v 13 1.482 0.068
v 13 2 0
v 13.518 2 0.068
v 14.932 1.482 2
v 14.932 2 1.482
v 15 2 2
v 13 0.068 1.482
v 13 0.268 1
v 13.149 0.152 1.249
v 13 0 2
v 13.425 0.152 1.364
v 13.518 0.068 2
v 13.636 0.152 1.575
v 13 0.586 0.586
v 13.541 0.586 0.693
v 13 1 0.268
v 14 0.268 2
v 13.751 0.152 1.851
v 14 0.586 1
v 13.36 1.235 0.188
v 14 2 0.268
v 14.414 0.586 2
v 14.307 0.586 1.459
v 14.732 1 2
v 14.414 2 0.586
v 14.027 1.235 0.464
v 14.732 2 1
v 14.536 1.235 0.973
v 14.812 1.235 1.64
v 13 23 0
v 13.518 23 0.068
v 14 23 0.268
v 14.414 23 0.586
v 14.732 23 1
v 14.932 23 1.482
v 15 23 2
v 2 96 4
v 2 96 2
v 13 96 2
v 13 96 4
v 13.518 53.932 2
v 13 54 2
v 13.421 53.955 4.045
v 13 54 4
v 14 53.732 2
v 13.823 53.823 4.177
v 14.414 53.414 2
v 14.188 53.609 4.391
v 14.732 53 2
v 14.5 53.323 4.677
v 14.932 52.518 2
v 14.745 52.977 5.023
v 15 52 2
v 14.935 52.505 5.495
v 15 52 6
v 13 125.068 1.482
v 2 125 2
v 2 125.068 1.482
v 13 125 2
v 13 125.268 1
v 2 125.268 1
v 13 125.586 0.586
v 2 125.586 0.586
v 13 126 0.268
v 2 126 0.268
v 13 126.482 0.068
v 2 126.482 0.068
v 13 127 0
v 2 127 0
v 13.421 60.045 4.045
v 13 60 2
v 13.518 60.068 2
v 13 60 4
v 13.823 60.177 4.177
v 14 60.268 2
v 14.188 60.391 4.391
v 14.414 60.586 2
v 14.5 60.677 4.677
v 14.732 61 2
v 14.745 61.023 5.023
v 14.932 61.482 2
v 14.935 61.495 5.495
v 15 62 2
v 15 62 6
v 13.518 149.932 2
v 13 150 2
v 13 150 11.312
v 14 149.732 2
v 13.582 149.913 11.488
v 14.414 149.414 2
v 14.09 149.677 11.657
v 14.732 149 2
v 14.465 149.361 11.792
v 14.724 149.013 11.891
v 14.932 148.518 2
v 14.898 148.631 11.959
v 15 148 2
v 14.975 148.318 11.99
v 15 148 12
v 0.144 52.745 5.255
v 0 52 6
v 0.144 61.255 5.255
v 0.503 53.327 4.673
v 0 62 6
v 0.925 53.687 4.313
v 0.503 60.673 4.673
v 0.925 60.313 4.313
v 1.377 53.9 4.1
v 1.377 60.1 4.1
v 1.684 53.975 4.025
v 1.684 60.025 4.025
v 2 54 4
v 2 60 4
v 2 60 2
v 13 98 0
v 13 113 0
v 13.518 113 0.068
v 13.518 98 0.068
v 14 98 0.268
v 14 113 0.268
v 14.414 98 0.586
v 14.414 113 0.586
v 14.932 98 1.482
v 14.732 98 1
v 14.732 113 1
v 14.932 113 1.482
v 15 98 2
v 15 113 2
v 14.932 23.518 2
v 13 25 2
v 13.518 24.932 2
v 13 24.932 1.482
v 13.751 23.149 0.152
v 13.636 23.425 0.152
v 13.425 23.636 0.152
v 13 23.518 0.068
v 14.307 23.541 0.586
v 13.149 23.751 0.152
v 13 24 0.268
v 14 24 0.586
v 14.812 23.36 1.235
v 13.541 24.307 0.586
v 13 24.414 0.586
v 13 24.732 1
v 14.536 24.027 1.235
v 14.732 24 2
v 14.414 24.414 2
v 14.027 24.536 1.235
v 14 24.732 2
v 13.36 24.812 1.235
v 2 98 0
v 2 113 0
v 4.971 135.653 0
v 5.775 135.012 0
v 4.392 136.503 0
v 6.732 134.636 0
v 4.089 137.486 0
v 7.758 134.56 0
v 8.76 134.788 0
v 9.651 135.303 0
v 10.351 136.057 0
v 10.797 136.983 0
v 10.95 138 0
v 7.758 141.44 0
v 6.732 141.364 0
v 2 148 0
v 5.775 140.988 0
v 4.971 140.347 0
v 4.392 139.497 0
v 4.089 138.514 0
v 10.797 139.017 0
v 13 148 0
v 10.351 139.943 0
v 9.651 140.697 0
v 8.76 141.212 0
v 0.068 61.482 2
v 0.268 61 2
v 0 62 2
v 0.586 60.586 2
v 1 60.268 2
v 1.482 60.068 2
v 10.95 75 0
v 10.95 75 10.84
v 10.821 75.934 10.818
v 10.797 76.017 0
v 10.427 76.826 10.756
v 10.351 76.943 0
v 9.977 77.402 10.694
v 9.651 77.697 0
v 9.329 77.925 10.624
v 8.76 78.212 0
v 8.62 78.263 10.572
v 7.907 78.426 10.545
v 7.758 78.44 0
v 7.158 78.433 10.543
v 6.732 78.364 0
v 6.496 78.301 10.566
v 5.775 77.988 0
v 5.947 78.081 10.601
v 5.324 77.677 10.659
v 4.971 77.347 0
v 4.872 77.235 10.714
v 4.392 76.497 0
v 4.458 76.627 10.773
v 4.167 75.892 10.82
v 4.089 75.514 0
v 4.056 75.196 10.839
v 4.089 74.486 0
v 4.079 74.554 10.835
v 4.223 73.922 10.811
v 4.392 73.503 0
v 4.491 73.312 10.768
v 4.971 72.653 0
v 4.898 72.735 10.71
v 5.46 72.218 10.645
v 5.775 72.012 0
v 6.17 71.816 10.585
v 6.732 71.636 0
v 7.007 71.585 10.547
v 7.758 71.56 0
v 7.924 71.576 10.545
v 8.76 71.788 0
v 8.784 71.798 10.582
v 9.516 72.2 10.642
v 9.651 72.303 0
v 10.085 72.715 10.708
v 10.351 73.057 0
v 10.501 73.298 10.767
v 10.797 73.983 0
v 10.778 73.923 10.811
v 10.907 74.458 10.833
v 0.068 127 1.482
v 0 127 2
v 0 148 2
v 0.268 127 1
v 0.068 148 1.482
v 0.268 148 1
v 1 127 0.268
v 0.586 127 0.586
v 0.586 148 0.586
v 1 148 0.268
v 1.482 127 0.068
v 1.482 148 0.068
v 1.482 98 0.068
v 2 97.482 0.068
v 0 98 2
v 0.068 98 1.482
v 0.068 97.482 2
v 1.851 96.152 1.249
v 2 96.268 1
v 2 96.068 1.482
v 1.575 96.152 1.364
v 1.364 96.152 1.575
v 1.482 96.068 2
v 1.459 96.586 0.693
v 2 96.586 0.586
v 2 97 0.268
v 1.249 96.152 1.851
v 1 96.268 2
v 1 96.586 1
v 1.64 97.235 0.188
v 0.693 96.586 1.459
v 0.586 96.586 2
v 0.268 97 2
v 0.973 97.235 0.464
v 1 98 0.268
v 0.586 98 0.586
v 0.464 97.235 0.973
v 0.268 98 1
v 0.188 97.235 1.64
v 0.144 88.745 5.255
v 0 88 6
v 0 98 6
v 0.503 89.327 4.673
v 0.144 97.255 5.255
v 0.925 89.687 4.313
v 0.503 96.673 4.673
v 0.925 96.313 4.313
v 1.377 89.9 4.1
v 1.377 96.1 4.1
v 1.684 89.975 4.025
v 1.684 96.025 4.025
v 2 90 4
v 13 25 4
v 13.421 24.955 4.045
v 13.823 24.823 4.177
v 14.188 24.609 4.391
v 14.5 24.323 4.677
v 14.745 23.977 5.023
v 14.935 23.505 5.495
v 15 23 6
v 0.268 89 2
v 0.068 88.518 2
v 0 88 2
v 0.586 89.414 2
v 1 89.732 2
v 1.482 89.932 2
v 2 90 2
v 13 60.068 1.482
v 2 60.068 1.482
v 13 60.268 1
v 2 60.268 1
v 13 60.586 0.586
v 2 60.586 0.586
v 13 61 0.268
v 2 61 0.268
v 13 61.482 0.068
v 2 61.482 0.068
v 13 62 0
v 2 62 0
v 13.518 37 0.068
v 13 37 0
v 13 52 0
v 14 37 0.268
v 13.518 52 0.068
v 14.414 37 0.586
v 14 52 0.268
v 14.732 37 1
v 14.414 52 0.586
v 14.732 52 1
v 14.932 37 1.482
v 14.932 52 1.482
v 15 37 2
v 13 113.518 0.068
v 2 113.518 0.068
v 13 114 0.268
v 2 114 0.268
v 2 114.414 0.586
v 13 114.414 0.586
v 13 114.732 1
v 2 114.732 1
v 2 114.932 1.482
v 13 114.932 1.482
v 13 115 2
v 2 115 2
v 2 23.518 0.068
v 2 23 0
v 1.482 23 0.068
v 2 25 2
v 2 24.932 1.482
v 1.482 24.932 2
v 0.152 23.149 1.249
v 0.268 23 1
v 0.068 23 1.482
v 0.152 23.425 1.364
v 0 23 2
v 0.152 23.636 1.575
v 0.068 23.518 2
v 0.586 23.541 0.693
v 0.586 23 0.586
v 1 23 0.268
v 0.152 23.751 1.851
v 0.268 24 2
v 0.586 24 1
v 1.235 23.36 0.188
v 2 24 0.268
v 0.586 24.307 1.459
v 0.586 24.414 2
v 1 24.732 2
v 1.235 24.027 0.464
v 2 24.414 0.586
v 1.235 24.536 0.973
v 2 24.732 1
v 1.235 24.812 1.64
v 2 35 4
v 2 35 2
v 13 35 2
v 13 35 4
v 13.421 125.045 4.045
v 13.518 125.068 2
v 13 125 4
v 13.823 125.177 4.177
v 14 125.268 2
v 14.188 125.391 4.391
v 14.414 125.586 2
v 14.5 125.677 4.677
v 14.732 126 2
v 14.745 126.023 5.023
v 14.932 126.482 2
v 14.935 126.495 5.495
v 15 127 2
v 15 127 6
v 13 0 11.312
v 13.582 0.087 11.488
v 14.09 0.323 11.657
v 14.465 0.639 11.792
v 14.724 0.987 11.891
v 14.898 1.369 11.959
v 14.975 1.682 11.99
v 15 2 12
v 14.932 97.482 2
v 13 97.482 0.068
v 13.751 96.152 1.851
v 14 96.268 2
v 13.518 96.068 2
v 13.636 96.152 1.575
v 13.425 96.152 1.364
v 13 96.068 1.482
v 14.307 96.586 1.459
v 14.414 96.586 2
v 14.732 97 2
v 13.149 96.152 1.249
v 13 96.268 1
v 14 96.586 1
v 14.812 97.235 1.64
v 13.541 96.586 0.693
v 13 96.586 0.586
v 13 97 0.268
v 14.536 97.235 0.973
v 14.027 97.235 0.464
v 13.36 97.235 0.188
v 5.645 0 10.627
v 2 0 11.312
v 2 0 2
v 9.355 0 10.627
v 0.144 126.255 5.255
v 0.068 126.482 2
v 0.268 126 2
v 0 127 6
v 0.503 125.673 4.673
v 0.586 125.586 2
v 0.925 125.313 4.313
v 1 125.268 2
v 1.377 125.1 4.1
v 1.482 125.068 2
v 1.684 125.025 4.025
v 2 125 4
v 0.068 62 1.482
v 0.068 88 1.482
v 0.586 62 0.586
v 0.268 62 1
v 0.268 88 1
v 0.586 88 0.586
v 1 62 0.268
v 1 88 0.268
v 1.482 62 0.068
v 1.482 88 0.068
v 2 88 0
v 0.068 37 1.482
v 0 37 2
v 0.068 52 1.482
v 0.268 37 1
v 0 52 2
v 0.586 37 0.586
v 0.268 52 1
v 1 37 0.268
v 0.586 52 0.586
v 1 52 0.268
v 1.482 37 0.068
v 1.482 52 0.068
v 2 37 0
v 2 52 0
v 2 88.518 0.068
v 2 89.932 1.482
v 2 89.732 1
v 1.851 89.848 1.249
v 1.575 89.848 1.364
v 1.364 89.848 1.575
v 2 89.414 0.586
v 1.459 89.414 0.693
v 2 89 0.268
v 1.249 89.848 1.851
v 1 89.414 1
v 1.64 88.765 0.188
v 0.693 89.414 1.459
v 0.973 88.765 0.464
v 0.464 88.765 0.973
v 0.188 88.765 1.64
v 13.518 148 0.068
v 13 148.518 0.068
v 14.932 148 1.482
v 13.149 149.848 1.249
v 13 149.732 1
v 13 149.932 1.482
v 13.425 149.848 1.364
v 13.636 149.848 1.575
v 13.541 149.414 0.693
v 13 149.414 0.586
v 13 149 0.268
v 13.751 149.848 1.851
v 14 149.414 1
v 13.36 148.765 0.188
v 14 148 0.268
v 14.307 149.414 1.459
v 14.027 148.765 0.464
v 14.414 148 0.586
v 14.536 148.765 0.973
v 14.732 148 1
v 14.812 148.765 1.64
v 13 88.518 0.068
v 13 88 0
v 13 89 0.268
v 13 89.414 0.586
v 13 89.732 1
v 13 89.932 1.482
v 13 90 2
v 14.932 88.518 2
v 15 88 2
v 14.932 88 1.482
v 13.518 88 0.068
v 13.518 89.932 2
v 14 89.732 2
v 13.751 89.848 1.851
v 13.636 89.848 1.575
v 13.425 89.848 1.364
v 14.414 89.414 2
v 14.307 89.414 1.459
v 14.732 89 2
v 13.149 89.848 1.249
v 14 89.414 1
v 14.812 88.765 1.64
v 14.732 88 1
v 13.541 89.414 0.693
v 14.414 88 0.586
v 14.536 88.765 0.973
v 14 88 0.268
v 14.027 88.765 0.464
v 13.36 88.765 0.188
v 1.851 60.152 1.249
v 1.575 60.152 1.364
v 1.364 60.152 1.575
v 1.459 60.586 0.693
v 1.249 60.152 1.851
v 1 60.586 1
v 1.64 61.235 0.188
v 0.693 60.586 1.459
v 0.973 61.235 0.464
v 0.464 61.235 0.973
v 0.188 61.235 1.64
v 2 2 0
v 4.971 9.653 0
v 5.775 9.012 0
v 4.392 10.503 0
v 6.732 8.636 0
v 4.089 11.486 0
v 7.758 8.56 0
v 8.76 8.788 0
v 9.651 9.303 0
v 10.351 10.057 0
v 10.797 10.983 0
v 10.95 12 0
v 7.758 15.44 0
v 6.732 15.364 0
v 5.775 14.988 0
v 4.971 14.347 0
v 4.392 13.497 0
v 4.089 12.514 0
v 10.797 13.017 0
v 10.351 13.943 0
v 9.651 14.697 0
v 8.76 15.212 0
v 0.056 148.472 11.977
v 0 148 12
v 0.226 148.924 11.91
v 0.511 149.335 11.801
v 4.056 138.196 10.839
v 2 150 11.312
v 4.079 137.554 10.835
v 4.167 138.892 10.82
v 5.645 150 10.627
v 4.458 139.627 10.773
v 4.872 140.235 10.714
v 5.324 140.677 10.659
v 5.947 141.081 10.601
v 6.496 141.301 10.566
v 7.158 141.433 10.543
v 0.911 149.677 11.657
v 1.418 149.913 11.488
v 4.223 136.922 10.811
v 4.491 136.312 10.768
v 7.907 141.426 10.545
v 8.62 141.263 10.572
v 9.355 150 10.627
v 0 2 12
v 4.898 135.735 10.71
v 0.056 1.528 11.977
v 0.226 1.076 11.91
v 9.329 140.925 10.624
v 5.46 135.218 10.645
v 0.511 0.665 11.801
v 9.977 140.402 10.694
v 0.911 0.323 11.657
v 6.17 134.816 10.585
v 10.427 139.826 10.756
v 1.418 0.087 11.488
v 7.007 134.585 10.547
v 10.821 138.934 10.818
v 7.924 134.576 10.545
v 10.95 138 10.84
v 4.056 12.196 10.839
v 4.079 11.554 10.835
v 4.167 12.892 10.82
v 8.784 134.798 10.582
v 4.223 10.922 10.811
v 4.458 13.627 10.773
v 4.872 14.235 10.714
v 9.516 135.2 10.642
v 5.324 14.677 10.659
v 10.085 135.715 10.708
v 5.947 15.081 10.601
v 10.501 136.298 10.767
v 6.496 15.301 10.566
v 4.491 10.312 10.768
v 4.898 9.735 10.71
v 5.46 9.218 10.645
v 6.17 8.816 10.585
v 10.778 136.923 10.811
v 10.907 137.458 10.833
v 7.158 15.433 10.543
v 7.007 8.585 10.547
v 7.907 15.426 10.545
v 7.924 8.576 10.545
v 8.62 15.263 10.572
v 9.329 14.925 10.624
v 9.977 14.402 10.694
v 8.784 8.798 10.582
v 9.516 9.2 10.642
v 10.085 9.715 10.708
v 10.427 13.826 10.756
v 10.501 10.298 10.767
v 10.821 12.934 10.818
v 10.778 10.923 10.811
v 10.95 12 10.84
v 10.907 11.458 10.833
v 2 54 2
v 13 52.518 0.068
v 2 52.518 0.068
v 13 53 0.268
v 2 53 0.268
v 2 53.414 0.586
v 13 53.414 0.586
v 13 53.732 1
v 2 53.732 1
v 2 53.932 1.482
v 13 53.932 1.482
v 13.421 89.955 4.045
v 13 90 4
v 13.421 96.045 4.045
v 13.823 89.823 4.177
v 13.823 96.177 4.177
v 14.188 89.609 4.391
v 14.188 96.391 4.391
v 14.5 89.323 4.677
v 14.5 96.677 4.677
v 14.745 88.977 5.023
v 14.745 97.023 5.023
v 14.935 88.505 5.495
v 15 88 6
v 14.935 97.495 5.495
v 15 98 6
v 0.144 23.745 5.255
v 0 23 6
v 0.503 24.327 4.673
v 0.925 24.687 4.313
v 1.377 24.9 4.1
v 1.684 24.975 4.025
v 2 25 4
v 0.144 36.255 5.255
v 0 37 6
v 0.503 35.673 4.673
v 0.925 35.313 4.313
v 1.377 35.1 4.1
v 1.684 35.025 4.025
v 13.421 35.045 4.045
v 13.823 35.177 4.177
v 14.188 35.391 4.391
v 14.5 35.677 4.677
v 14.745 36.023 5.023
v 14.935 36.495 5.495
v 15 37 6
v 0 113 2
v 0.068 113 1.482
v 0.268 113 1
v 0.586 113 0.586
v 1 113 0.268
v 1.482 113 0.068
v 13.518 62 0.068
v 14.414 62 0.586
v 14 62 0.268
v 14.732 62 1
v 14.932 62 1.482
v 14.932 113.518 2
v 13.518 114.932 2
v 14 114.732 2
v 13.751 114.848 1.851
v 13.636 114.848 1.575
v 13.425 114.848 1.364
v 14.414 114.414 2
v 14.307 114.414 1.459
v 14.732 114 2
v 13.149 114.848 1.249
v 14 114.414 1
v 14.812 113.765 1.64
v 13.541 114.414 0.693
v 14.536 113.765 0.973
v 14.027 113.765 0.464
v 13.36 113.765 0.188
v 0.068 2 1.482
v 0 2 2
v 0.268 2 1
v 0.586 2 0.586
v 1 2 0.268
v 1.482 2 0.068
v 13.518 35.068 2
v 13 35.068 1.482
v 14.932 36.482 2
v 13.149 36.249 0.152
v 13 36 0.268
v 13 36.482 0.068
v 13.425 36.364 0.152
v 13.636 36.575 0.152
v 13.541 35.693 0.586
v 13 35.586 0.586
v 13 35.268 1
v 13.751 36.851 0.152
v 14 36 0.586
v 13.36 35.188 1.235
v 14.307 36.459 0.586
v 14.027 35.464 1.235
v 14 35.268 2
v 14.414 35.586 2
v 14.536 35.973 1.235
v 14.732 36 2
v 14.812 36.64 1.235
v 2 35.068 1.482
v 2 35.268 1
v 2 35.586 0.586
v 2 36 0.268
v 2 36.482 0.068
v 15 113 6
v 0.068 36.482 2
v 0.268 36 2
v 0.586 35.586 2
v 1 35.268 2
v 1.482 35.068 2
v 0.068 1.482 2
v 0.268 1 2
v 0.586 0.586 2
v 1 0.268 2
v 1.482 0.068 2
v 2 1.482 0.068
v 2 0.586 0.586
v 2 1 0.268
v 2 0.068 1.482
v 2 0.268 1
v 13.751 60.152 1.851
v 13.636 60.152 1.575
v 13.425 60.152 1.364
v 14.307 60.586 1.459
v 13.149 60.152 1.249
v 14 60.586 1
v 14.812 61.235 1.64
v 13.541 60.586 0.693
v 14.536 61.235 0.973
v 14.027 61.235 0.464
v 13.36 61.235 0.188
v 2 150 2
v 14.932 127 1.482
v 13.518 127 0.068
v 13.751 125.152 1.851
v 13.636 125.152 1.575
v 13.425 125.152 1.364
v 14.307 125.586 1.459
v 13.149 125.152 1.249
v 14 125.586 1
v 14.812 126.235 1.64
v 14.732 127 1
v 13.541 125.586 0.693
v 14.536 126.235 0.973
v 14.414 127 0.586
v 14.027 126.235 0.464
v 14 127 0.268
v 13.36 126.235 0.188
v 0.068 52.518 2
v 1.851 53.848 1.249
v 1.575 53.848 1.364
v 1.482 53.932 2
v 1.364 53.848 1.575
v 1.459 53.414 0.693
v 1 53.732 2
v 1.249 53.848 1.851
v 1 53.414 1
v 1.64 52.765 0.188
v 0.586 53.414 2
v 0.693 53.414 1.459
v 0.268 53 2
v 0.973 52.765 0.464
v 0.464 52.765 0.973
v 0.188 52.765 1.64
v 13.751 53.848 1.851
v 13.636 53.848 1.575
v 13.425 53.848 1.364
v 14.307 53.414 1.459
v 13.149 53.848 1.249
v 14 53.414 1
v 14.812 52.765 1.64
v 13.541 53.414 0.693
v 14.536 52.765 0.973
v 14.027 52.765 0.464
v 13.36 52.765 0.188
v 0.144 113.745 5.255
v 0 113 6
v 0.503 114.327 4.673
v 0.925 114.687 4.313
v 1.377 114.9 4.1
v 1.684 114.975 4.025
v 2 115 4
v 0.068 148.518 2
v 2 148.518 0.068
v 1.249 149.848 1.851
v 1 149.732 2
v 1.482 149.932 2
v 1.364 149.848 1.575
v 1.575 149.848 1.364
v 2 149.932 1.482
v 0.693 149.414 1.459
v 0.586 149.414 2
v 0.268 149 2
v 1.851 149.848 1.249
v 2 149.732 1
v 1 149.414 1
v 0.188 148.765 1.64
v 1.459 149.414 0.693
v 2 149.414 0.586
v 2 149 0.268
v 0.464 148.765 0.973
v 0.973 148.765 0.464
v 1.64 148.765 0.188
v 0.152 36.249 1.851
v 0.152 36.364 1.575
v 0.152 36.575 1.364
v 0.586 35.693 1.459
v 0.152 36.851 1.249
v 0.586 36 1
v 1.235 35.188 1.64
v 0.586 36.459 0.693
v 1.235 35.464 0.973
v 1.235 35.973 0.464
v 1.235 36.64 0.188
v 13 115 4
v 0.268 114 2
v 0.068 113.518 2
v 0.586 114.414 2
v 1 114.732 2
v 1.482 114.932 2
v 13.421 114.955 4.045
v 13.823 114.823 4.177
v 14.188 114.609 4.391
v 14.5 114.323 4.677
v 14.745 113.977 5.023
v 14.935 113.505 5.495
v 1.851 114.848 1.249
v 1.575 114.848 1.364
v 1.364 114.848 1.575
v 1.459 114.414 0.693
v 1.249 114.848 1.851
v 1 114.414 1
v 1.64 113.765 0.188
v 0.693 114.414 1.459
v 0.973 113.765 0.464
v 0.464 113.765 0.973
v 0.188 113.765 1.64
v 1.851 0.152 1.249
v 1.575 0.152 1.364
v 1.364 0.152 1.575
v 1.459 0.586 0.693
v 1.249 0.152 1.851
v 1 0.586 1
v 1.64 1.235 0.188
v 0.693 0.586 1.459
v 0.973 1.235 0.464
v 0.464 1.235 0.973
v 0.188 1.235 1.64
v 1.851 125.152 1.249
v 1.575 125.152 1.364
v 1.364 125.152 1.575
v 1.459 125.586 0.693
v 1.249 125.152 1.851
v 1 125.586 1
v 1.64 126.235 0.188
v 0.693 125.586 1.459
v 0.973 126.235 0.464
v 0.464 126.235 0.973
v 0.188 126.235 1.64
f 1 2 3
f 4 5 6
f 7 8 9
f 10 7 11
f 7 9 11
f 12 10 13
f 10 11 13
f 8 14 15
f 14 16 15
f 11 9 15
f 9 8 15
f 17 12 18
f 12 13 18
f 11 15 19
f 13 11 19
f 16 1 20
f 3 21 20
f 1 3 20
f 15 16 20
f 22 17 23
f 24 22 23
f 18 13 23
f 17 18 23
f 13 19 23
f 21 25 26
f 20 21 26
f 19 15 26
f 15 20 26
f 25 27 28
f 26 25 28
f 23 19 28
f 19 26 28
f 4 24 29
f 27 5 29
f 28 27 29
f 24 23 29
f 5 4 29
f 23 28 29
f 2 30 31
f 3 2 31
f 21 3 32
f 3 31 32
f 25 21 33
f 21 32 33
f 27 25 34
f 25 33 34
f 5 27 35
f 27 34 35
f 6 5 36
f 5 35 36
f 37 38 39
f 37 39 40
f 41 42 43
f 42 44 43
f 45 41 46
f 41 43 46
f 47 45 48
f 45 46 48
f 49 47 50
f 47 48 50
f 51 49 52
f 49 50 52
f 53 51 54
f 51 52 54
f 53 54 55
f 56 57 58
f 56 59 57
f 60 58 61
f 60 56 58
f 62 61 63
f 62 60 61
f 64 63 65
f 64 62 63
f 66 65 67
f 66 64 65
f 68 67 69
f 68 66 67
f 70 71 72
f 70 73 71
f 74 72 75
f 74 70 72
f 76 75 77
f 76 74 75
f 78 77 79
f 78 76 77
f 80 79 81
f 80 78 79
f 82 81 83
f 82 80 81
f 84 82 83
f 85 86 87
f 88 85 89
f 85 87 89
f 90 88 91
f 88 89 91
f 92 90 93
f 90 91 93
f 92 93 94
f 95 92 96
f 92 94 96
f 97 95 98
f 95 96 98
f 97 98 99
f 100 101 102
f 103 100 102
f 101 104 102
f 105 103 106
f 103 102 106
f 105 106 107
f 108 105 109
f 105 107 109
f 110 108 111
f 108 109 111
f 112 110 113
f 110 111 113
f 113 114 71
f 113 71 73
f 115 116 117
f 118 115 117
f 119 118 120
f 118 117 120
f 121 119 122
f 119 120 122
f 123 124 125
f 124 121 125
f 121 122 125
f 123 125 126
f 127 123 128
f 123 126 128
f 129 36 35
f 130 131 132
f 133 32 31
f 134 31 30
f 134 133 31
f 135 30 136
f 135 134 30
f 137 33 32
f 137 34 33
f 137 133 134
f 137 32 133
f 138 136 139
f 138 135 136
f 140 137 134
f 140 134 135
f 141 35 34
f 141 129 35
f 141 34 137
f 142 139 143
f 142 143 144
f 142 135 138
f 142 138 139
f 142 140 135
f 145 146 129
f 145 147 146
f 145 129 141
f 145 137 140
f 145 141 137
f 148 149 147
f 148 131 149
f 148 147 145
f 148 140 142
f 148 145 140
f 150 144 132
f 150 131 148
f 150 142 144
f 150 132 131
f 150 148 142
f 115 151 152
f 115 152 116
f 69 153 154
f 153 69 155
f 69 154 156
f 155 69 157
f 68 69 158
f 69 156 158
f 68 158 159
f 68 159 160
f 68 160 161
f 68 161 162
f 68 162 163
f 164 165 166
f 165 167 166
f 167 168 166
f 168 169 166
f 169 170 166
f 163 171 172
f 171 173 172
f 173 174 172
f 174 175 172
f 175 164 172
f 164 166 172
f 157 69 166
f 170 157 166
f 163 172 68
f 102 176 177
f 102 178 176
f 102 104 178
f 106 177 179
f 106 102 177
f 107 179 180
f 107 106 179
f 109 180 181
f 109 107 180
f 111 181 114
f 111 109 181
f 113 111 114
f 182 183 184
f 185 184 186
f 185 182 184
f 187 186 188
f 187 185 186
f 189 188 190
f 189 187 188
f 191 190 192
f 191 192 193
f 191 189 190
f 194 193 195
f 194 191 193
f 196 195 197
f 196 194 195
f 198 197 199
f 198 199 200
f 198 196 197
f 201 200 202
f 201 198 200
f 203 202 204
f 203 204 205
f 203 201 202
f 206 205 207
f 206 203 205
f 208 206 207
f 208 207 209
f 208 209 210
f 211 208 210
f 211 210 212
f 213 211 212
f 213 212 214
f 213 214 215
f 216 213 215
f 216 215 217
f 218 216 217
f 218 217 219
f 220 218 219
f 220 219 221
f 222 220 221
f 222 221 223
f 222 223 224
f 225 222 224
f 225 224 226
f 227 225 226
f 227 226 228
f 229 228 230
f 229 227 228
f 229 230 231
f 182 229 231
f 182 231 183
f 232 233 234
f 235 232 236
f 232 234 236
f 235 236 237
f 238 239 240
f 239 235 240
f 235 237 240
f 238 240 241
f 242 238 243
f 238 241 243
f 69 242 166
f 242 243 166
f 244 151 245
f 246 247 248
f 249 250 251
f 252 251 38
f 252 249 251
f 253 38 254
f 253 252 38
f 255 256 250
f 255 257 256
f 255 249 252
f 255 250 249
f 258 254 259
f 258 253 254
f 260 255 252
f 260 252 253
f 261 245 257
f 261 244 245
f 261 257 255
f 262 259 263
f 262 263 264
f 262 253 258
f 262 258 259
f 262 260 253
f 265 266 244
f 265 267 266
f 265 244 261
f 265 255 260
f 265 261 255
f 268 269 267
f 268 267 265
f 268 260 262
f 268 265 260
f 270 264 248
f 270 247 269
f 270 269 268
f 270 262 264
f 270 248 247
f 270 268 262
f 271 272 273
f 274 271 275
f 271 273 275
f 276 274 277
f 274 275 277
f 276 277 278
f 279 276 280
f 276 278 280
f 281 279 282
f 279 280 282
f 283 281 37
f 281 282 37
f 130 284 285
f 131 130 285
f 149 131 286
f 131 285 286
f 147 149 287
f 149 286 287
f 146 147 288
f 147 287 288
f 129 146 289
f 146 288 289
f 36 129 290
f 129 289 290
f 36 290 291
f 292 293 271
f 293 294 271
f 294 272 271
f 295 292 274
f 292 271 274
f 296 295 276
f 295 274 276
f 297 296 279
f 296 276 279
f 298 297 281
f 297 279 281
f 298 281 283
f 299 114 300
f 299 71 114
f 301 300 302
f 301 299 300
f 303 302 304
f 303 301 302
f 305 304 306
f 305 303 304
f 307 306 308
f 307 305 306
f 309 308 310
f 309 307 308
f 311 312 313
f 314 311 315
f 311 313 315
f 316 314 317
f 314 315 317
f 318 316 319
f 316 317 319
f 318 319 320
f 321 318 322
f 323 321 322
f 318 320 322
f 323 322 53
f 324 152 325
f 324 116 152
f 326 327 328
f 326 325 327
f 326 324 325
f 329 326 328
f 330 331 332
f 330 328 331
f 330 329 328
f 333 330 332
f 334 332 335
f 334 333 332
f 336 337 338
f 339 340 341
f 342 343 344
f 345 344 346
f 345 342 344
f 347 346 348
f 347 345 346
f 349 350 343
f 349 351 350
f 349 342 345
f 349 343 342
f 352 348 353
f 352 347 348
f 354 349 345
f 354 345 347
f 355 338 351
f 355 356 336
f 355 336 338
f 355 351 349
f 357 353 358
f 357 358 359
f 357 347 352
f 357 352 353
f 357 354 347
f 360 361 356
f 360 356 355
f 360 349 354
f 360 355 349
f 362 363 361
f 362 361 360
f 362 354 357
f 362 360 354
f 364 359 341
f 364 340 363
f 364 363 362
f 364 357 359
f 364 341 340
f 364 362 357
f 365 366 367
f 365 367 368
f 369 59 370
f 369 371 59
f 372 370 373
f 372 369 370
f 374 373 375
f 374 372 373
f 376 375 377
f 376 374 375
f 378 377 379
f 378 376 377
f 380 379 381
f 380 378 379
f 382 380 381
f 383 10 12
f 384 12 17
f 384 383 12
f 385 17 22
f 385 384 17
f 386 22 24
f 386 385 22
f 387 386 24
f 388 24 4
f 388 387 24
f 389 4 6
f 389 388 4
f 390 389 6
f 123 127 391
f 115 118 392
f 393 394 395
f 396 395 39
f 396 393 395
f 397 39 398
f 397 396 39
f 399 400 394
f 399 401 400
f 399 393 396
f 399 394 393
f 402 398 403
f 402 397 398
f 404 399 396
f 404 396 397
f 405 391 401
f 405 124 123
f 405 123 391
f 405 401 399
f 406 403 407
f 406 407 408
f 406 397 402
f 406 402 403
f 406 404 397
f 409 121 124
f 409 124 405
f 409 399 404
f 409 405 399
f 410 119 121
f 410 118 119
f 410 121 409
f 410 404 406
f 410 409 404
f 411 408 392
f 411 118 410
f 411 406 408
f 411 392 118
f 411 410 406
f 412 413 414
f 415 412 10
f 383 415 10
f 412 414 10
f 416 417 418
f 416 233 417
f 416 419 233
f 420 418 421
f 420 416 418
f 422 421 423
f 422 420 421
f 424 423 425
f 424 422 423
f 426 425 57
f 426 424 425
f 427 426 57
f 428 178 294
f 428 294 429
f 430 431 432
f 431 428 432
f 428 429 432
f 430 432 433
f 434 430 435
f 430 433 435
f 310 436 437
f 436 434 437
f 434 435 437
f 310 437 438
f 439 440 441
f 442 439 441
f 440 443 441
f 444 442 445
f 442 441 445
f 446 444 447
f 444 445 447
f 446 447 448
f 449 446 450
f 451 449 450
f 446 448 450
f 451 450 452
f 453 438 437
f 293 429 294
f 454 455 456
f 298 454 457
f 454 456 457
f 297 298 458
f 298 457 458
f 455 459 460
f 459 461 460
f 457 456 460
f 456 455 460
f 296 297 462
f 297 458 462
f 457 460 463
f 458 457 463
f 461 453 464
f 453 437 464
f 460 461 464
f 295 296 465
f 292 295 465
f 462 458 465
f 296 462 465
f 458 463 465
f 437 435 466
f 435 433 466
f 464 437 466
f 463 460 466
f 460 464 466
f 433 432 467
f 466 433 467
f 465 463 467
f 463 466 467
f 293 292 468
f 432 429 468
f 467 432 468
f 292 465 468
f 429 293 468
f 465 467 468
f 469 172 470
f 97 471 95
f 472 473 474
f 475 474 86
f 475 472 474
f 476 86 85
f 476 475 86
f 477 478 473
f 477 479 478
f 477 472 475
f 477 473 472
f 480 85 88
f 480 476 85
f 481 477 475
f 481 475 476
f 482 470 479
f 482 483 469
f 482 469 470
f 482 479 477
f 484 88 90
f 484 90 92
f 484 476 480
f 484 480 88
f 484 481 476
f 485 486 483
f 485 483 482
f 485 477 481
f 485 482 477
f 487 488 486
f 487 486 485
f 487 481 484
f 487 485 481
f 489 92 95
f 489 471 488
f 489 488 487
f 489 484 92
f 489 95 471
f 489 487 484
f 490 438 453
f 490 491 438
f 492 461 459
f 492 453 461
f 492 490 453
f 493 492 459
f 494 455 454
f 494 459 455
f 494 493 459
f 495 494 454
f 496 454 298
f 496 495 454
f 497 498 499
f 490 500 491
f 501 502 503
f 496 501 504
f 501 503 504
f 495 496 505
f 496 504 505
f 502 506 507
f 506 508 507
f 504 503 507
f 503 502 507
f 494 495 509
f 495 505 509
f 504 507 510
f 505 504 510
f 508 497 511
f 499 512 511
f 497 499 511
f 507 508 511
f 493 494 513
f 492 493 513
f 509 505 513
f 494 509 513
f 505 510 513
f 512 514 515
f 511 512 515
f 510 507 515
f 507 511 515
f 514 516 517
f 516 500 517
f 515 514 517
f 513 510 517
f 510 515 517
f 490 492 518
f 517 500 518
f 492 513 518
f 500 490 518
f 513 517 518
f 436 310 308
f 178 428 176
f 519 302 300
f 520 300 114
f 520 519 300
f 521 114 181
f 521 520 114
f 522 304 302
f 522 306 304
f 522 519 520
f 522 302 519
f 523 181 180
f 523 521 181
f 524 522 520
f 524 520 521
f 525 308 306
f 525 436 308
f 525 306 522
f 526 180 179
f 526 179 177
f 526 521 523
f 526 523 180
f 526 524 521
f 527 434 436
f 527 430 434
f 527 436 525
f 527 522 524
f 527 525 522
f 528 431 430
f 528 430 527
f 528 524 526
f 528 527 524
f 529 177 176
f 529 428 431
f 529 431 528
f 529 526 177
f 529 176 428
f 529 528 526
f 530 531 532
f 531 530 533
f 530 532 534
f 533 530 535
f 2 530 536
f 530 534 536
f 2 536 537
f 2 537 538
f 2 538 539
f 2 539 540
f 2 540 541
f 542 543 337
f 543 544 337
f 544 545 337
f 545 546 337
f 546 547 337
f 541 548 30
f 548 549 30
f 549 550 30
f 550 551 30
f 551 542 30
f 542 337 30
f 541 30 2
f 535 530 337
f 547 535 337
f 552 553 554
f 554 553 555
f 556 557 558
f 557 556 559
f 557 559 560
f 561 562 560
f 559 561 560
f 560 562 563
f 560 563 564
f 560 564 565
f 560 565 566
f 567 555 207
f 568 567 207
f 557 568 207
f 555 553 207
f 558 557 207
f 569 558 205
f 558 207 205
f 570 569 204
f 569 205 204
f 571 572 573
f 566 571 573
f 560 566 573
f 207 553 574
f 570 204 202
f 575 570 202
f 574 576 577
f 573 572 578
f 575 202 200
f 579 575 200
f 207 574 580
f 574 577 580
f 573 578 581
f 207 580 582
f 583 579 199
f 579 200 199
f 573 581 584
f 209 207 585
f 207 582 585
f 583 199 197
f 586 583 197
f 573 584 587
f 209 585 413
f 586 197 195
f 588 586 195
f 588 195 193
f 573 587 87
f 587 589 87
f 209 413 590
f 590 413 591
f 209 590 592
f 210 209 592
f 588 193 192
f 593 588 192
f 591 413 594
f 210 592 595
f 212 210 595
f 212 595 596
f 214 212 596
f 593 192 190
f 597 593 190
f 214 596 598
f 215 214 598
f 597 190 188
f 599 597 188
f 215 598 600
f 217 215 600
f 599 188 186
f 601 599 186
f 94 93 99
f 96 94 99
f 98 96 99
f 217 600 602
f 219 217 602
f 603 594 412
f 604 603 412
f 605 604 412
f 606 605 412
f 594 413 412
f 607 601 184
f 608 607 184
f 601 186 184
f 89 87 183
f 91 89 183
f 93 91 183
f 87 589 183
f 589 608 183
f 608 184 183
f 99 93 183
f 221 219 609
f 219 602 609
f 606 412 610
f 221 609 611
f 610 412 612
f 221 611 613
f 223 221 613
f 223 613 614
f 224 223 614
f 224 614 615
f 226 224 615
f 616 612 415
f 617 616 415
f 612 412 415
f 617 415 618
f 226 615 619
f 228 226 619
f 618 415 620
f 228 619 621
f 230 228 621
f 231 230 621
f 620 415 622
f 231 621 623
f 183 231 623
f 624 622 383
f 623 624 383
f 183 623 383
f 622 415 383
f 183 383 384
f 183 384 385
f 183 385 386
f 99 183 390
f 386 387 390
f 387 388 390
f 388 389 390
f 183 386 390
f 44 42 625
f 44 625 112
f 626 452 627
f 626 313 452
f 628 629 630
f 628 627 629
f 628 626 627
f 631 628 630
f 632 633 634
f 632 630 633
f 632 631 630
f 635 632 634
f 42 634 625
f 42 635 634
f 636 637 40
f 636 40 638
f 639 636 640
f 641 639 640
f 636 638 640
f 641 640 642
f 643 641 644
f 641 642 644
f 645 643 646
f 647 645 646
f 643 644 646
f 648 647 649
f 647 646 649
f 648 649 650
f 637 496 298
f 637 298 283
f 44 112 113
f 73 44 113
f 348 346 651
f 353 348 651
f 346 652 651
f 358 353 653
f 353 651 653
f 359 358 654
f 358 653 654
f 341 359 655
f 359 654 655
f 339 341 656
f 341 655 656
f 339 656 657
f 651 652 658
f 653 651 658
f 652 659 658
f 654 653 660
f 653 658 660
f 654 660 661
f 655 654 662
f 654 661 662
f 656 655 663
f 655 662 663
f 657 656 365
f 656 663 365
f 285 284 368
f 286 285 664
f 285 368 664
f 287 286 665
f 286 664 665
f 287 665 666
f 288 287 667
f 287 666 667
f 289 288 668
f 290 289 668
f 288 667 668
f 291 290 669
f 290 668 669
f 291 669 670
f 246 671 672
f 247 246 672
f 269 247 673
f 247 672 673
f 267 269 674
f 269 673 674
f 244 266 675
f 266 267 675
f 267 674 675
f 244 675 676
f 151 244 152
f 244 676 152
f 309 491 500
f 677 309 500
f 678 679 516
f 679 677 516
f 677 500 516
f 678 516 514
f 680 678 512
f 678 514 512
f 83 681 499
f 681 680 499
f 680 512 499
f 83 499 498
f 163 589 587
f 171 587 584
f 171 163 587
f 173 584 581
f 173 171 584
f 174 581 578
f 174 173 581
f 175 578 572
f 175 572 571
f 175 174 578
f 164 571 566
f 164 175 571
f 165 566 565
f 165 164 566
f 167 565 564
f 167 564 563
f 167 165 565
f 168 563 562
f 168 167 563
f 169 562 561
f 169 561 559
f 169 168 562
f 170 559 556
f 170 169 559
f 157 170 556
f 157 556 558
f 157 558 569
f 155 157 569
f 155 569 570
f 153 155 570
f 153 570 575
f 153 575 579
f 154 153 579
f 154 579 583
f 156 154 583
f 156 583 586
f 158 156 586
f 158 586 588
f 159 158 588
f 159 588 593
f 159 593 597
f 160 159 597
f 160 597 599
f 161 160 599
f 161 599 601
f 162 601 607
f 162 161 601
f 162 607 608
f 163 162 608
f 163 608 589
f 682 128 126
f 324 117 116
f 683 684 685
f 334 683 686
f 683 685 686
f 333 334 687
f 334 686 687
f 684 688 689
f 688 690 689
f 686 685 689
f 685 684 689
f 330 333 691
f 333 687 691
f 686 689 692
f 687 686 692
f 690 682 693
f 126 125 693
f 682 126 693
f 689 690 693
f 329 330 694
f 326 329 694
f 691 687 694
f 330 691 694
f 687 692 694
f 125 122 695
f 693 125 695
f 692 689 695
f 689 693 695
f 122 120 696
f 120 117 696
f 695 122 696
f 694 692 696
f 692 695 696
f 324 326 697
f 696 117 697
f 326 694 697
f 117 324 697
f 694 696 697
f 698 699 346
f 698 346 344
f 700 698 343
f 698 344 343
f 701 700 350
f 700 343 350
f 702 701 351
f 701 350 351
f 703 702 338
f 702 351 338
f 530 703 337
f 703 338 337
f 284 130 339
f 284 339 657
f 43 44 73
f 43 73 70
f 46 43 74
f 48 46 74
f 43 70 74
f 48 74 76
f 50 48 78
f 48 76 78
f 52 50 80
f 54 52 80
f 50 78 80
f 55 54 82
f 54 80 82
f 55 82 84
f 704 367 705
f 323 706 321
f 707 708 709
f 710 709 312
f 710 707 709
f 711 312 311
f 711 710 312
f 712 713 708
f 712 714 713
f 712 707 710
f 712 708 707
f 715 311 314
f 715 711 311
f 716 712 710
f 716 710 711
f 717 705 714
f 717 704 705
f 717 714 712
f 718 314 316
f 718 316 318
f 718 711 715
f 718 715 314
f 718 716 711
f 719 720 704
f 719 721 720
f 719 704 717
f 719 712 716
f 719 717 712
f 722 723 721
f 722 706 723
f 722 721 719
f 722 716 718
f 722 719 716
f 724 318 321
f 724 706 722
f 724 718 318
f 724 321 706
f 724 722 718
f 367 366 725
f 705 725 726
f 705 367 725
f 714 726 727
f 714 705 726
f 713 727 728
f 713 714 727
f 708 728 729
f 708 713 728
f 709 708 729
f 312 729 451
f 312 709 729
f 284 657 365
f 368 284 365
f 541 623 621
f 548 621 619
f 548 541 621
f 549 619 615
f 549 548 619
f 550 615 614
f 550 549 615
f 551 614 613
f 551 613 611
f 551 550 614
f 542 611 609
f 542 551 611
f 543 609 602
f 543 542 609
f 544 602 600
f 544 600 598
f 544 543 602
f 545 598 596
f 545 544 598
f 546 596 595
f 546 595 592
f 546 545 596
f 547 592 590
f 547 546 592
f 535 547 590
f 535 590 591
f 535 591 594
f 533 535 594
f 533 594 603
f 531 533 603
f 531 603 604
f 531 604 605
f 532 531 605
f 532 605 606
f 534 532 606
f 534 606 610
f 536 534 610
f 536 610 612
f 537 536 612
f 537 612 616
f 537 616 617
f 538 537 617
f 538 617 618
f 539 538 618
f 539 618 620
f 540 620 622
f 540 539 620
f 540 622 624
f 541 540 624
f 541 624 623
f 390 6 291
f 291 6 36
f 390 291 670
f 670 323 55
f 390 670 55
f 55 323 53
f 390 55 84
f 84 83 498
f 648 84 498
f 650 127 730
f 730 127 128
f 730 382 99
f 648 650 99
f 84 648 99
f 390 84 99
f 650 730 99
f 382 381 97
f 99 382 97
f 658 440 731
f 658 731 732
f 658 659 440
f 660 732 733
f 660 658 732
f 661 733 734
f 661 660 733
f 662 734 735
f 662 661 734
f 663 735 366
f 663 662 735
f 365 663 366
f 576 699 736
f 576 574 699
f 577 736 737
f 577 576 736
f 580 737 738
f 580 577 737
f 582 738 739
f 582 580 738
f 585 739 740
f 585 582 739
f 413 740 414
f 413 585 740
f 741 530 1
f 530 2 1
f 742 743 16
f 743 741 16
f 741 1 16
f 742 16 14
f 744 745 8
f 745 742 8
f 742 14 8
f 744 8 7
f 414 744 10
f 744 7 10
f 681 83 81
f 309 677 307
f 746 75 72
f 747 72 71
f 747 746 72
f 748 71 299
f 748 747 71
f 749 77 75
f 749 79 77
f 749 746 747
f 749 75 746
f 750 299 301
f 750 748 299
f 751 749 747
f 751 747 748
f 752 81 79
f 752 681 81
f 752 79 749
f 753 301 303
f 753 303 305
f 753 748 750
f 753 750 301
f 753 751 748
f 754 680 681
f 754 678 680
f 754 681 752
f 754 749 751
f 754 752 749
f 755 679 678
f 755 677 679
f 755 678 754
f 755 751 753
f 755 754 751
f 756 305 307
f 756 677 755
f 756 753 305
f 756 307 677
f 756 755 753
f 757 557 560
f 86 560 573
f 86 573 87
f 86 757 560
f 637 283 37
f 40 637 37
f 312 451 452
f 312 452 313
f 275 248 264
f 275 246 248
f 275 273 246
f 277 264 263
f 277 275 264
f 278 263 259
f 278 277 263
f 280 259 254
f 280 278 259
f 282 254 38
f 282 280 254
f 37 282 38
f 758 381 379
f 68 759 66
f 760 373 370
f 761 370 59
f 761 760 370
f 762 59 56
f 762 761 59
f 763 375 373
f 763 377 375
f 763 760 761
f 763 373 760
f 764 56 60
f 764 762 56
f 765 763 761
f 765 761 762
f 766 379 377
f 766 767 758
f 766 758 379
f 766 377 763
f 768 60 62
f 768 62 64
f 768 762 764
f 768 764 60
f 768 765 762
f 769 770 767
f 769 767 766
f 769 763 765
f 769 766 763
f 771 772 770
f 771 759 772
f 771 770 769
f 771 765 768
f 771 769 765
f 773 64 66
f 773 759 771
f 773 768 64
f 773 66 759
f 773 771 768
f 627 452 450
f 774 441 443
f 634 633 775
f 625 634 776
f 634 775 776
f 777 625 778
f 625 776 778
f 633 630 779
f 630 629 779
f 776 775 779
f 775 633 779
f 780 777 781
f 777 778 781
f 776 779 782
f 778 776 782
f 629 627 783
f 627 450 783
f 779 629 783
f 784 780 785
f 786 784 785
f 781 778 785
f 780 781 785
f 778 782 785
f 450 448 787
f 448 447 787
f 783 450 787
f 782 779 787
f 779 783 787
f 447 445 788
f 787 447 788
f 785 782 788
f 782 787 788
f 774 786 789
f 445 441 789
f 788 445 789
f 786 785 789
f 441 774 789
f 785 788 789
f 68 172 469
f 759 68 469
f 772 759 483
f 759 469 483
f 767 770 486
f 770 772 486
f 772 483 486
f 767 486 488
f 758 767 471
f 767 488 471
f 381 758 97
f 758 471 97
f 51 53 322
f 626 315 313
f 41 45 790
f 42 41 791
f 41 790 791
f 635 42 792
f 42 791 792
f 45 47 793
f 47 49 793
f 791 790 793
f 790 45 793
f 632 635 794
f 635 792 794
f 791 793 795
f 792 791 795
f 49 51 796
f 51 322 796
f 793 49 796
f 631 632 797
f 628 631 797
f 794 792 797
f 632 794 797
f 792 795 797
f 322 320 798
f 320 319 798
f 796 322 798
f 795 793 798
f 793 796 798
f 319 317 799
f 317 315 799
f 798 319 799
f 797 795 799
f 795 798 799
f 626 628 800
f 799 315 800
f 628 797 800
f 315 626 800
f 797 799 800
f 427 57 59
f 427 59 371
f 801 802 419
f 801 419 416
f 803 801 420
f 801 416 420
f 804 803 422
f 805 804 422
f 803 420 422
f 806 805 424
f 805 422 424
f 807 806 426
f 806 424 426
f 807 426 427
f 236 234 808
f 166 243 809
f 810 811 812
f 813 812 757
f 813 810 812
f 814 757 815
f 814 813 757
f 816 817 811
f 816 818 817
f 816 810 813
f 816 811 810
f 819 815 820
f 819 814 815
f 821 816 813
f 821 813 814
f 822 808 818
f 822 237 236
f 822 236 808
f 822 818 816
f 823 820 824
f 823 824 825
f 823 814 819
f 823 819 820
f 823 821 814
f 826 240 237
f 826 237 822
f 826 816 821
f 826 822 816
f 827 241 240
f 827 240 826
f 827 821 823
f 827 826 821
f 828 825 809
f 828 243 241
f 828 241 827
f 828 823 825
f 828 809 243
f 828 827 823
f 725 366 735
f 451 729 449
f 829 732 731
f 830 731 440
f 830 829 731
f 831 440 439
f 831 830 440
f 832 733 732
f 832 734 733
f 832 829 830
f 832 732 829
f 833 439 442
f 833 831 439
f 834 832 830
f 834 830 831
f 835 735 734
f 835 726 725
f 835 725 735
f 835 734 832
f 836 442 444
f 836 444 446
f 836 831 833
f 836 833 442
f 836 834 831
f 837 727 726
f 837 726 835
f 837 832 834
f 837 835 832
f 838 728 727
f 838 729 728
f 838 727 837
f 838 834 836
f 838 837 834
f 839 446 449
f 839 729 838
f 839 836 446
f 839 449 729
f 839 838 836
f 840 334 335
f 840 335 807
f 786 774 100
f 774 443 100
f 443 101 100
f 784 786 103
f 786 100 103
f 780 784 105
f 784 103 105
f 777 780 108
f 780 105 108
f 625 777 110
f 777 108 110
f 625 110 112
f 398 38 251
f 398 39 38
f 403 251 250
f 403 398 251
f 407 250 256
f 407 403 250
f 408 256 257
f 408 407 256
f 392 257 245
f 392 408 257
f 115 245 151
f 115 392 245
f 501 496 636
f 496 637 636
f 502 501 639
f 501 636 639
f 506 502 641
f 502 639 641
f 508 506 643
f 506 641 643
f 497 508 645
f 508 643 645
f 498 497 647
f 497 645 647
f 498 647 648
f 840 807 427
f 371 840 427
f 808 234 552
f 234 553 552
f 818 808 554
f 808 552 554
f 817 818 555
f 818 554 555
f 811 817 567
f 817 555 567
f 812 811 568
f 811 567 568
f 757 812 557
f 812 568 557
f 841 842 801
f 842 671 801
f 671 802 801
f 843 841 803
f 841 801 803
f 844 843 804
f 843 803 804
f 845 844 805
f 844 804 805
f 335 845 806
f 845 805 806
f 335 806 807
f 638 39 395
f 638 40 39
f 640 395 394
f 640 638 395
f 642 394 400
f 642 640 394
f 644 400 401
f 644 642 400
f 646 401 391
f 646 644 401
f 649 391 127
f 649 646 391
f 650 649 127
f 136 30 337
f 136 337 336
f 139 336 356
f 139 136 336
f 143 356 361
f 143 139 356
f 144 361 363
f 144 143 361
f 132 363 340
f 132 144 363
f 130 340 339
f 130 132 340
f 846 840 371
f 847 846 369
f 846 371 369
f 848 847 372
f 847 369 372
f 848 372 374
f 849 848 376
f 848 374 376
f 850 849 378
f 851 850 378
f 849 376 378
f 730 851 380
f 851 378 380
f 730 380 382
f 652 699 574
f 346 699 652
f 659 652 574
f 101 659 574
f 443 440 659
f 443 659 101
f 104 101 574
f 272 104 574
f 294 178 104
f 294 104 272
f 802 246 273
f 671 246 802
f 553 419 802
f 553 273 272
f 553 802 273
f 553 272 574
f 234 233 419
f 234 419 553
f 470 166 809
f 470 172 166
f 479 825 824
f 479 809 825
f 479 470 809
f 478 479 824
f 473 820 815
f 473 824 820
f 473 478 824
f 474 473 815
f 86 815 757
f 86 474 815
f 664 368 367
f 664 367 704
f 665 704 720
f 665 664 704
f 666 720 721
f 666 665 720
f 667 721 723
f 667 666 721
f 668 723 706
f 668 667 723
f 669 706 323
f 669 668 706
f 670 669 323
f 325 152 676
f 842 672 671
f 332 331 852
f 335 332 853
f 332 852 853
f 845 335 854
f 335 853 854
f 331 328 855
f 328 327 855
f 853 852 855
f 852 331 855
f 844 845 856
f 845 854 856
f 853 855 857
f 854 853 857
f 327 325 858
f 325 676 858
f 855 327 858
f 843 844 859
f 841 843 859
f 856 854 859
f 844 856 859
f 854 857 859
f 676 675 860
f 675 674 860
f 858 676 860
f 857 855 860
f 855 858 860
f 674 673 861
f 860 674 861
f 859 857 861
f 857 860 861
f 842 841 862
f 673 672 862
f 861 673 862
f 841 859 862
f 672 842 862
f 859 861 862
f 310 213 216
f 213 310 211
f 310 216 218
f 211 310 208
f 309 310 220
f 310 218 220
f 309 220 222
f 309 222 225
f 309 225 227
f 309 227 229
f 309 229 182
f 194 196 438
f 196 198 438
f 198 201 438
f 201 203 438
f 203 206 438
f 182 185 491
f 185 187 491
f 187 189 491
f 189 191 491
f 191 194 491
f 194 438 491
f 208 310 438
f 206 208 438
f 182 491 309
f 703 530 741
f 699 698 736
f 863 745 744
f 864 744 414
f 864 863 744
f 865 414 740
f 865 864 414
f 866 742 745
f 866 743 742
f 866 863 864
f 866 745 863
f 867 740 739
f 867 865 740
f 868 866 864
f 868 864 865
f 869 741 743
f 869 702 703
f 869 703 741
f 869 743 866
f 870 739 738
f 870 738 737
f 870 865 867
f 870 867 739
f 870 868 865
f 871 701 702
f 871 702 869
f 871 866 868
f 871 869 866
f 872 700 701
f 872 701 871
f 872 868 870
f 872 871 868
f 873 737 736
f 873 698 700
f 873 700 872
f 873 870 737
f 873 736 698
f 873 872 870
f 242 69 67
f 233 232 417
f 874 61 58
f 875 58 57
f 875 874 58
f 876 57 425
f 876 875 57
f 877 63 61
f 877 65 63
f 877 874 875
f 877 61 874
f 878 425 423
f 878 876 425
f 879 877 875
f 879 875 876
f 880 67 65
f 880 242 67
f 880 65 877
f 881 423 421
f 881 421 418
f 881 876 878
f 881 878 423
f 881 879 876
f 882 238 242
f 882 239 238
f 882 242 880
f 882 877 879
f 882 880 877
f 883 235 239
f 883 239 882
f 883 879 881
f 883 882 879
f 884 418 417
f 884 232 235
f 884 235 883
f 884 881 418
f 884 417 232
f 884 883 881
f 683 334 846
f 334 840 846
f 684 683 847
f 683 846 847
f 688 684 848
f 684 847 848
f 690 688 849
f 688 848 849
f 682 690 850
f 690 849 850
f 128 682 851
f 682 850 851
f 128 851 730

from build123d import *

# Parameters (mm, degrees)
SKETCH_W        = 15
SKETCH_H        = 150
SKETCH_R        = 3.45
PAD_DEPTH       = 12
SKETCH003_W     = 10
SKETCH003_H     = 4
SKETCH003_W_2   = 6
POCKET002_DEPTH = 15.001
SKETCH004_R     = 20
POCKET003_DEPTH = 150.001
FILLET_R        = 2


with BuildPart() as part:
    # Sketch → Pad (new body)
    with BuildSketch(Plane.XY):
        with Locations((7.5, 75)):
            Rectangle(SKETCH_W, SKETCH_H)
        with Locations((7.5, 138)):
            Circle(SKETCH_R, mode=Mode.SUBTRACT)
        with Locations((7.5, 75)):
            Circle(SKETCH_R, mode=Mode.SUBTRACT)
        with Locations((7.5, 12)):
            Circle(SKETCH_R, mode=Mode.SUBTRACT)
    extrude(amount=PAD_DEPTH)

    # Sketch003 → Pocket002 (cut, through all)
    with BuildSketch(Plane.YZ):
        with Locations((30, 2)):
            Rectangle(SKETCH003_W, SKETCH003_H)
        with Locations((57, 2)):
            Rectangle(SKETCH003_W_2, SKETCH003_H)
        with Locations((120, 2)):
            Rectangle(SKETCH003_W, SKETCH003_H)
        with Locations((93, 2)):
            Rectangle(SKETCH003_W_2, SKETCH003_H)
    extrude(amount=POCKET002_DEPTH, mode=Mode.SUBTRACT)

    # Sketch004 → Pocket003 (cut, through all)
    with BuildSketch(Plane.XZ):
        with Locations((7.5, 30.540496)):
            Circle(SKETCH004_R)
    extrude(amount=-POCKET003_DEPTH, mode=Mode.SUBTRACT)

    # Fillet
    fillet_edges = [part.edges().sort_by_distance(p)[0] for p in [
        (15, 25, 2),
        (15, 30, 4),
        (15, 35, 2),
        (15, 12.5, 0),
        (7.5, 25, 0),
        (7.5, 35, 0),
        (0, 12.5, 0),
        (0, 25, 2),
        (0, 30, 4),
        (0, 35, 2),
        (0, 44.5, 0),
        (15, 44.5, 0),
        (7.5, 0, 0),
        (0, 0, 6),
        (15, 0, 6),
        (0, 75, 0),
        (15, 75, 0),
        (15, 105.5, 0),
        (0, 105.5, 0),
        (0, 137.5, 0),
        (15, 137.5, 0),
        (0, 150, 6),
        (7.5, 150, 0),
        (15, 150, 6),
        (15, 54, 2),
        (15, 57, 4),
        (15, 60, 2),
        (15, 90, 2),
        (15, 93, 4),
        (15, 96, 2),
        (15, 115, 2),
        (15, 120, 4),
        (15, 125, 2),
        (7.5, 54, 0),
        (7.5, 60, 0),
        (0, 54, 2),
        (0, 57, 4),
        (0, 60, 2),
        (7.5, 90, 0),
        (7.5, 96, 0),
        (0, 93, 4),
        (0, 96, 2),
        (0, 90, 2),
        (7.5, 115, 0),
        (7.5, 125, 0),
        (0, 125, 2),
        (0, 120, 4),
        (0, 115, 2),
    ]]
    fillet(fillet_edges, radius=FILLET_R)


solid = part.part
